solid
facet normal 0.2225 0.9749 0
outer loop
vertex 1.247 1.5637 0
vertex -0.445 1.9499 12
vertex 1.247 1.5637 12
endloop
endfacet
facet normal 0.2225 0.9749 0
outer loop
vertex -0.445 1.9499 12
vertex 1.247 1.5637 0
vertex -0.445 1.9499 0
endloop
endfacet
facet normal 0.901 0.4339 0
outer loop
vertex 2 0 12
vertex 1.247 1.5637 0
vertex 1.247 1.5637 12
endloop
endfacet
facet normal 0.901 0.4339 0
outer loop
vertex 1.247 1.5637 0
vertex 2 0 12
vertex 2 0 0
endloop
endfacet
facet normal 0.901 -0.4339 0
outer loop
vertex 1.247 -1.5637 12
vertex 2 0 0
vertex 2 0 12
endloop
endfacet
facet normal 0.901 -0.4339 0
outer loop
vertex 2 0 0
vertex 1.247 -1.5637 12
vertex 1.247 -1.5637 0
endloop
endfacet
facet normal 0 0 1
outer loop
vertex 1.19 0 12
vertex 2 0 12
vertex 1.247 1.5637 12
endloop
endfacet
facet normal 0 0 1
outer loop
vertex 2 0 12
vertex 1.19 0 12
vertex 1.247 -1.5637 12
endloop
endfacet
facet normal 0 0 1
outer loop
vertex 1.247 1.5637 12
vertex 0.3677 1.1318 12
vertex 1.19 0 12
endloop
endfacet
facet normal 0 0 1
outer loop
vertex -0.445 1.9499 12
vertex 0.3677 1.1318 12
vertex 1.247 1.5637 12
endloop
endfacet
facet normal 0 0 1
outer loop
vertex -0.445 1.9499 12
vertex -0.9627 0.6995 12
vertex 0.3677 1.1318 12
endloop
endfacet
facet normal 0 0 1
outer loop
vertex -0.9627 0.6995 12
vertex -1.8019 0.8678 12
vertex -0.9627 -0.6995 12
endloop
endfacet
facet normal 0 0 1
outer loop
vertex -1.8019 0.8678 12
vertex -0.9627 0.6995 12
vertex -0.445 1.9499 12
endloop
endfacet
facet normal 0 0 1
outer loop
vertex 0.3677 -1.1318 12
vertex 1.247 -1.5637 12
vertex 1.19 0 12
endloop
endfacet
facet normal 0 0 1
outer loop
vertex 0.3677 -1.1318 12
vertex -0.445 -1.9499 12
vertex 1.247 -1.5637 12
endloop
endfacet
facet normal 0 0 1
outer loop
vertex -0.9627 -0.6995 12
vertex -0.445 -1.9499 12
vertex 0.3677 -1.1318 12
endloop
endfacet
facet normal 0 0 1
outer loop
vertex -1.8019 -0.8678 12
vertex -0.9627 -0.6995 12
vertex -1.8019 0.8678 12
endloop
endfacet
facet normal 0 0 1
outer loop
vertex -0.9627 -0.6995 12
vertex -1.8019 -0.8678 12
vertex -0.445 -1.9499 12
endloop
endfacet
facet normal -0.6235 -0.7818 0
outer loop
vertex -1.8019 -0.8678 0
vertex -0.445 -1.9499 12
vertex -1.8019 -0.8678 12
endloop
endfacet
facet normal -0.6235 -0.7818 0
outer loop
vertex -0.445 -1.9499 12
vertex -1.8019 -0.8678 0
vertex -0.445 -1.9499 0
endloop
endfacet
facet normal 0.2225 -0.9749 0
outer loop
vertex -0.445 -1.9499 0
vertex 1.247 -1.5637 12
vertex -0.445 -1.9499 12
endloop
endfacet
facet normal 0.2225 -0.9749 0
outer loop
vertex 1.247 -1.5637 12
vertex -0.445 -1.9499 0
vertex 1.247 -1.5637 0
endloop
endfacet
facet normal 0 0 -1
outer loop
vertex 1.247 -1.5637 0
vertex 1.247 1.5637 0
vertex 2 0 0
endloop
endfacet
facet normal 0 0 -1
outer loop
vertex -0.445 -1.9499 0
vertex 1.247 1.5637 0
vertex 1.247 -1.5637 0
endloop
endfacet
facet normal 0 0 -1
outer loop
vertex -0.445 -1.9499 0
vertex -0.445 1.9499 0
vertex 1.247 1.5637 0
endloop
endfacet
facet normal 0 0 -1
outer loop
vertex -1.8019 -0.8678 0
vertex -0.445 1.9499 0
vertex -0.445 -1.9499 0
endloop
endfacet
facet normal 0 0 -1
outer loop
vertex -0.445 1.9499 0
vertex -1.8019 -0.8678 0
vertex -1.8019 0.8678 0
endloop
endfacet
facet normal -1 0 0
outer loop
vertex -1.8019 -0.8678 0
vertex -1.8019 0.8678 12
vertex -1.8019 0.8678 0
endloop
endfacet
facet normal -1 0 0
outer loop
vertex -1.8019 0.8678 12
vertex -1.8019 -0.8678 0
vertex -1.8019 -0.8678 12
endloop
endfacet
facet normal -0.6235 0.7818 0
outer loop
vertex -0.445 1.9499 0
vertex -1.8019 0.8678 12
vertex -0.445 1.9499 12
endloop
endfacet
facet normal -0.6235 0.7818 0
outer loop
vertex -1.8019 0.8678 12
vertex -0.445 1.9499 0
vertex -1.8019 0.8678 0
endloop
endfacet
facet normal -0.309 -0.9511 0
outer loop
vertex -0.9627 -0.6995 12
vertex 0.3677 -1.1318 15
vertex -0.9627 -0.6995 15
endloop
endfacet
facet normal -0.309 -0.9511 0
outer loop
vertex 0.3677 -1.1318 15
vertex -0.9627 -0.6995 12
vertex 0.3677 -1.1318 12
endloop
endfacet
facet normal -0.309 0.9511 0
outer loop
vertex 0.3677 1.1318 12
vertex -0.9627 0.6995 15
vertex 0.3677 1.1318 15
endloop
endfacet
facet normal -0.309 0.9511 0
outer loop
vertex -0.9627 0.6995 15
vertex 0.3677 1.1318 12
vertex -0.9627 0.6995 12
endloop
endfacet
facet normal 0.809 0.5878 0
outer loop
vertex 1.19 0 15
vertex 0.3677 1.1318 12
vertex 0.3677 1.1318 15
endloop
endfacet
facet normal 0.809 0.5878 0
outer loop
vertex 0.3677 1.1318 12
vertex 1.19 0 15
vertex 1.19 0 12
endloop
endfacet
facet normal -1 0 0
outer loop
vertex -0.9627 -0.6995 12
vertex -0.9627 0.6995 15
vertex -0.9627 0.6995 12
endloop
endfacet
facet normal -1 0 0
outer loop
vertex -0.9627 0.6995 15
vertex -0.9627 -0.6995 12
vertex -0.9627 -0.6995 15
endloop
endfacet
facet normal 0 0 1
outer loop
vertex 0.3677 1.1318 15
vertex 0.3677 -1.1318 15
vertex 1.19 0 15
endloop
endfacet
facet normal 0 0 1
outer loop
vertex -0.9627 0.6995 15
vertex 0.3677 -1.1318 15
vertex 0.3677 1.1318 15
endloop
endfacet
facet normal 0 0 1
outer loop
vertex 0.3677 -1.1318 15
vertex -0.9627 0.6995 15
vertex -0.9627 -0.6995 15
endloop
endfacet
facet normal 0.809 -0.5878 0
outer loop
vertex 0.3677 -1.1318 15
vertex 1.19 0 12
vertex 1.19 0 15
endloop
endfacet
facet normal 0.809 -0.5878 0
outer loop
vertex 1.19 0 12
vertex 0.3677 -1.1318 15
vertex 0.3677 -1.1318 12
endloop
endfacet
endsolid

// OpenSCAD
cylinder(h=12, r=2);
translate([0,0,12]) {
    cylinder(h=3,r=1.19);
}
